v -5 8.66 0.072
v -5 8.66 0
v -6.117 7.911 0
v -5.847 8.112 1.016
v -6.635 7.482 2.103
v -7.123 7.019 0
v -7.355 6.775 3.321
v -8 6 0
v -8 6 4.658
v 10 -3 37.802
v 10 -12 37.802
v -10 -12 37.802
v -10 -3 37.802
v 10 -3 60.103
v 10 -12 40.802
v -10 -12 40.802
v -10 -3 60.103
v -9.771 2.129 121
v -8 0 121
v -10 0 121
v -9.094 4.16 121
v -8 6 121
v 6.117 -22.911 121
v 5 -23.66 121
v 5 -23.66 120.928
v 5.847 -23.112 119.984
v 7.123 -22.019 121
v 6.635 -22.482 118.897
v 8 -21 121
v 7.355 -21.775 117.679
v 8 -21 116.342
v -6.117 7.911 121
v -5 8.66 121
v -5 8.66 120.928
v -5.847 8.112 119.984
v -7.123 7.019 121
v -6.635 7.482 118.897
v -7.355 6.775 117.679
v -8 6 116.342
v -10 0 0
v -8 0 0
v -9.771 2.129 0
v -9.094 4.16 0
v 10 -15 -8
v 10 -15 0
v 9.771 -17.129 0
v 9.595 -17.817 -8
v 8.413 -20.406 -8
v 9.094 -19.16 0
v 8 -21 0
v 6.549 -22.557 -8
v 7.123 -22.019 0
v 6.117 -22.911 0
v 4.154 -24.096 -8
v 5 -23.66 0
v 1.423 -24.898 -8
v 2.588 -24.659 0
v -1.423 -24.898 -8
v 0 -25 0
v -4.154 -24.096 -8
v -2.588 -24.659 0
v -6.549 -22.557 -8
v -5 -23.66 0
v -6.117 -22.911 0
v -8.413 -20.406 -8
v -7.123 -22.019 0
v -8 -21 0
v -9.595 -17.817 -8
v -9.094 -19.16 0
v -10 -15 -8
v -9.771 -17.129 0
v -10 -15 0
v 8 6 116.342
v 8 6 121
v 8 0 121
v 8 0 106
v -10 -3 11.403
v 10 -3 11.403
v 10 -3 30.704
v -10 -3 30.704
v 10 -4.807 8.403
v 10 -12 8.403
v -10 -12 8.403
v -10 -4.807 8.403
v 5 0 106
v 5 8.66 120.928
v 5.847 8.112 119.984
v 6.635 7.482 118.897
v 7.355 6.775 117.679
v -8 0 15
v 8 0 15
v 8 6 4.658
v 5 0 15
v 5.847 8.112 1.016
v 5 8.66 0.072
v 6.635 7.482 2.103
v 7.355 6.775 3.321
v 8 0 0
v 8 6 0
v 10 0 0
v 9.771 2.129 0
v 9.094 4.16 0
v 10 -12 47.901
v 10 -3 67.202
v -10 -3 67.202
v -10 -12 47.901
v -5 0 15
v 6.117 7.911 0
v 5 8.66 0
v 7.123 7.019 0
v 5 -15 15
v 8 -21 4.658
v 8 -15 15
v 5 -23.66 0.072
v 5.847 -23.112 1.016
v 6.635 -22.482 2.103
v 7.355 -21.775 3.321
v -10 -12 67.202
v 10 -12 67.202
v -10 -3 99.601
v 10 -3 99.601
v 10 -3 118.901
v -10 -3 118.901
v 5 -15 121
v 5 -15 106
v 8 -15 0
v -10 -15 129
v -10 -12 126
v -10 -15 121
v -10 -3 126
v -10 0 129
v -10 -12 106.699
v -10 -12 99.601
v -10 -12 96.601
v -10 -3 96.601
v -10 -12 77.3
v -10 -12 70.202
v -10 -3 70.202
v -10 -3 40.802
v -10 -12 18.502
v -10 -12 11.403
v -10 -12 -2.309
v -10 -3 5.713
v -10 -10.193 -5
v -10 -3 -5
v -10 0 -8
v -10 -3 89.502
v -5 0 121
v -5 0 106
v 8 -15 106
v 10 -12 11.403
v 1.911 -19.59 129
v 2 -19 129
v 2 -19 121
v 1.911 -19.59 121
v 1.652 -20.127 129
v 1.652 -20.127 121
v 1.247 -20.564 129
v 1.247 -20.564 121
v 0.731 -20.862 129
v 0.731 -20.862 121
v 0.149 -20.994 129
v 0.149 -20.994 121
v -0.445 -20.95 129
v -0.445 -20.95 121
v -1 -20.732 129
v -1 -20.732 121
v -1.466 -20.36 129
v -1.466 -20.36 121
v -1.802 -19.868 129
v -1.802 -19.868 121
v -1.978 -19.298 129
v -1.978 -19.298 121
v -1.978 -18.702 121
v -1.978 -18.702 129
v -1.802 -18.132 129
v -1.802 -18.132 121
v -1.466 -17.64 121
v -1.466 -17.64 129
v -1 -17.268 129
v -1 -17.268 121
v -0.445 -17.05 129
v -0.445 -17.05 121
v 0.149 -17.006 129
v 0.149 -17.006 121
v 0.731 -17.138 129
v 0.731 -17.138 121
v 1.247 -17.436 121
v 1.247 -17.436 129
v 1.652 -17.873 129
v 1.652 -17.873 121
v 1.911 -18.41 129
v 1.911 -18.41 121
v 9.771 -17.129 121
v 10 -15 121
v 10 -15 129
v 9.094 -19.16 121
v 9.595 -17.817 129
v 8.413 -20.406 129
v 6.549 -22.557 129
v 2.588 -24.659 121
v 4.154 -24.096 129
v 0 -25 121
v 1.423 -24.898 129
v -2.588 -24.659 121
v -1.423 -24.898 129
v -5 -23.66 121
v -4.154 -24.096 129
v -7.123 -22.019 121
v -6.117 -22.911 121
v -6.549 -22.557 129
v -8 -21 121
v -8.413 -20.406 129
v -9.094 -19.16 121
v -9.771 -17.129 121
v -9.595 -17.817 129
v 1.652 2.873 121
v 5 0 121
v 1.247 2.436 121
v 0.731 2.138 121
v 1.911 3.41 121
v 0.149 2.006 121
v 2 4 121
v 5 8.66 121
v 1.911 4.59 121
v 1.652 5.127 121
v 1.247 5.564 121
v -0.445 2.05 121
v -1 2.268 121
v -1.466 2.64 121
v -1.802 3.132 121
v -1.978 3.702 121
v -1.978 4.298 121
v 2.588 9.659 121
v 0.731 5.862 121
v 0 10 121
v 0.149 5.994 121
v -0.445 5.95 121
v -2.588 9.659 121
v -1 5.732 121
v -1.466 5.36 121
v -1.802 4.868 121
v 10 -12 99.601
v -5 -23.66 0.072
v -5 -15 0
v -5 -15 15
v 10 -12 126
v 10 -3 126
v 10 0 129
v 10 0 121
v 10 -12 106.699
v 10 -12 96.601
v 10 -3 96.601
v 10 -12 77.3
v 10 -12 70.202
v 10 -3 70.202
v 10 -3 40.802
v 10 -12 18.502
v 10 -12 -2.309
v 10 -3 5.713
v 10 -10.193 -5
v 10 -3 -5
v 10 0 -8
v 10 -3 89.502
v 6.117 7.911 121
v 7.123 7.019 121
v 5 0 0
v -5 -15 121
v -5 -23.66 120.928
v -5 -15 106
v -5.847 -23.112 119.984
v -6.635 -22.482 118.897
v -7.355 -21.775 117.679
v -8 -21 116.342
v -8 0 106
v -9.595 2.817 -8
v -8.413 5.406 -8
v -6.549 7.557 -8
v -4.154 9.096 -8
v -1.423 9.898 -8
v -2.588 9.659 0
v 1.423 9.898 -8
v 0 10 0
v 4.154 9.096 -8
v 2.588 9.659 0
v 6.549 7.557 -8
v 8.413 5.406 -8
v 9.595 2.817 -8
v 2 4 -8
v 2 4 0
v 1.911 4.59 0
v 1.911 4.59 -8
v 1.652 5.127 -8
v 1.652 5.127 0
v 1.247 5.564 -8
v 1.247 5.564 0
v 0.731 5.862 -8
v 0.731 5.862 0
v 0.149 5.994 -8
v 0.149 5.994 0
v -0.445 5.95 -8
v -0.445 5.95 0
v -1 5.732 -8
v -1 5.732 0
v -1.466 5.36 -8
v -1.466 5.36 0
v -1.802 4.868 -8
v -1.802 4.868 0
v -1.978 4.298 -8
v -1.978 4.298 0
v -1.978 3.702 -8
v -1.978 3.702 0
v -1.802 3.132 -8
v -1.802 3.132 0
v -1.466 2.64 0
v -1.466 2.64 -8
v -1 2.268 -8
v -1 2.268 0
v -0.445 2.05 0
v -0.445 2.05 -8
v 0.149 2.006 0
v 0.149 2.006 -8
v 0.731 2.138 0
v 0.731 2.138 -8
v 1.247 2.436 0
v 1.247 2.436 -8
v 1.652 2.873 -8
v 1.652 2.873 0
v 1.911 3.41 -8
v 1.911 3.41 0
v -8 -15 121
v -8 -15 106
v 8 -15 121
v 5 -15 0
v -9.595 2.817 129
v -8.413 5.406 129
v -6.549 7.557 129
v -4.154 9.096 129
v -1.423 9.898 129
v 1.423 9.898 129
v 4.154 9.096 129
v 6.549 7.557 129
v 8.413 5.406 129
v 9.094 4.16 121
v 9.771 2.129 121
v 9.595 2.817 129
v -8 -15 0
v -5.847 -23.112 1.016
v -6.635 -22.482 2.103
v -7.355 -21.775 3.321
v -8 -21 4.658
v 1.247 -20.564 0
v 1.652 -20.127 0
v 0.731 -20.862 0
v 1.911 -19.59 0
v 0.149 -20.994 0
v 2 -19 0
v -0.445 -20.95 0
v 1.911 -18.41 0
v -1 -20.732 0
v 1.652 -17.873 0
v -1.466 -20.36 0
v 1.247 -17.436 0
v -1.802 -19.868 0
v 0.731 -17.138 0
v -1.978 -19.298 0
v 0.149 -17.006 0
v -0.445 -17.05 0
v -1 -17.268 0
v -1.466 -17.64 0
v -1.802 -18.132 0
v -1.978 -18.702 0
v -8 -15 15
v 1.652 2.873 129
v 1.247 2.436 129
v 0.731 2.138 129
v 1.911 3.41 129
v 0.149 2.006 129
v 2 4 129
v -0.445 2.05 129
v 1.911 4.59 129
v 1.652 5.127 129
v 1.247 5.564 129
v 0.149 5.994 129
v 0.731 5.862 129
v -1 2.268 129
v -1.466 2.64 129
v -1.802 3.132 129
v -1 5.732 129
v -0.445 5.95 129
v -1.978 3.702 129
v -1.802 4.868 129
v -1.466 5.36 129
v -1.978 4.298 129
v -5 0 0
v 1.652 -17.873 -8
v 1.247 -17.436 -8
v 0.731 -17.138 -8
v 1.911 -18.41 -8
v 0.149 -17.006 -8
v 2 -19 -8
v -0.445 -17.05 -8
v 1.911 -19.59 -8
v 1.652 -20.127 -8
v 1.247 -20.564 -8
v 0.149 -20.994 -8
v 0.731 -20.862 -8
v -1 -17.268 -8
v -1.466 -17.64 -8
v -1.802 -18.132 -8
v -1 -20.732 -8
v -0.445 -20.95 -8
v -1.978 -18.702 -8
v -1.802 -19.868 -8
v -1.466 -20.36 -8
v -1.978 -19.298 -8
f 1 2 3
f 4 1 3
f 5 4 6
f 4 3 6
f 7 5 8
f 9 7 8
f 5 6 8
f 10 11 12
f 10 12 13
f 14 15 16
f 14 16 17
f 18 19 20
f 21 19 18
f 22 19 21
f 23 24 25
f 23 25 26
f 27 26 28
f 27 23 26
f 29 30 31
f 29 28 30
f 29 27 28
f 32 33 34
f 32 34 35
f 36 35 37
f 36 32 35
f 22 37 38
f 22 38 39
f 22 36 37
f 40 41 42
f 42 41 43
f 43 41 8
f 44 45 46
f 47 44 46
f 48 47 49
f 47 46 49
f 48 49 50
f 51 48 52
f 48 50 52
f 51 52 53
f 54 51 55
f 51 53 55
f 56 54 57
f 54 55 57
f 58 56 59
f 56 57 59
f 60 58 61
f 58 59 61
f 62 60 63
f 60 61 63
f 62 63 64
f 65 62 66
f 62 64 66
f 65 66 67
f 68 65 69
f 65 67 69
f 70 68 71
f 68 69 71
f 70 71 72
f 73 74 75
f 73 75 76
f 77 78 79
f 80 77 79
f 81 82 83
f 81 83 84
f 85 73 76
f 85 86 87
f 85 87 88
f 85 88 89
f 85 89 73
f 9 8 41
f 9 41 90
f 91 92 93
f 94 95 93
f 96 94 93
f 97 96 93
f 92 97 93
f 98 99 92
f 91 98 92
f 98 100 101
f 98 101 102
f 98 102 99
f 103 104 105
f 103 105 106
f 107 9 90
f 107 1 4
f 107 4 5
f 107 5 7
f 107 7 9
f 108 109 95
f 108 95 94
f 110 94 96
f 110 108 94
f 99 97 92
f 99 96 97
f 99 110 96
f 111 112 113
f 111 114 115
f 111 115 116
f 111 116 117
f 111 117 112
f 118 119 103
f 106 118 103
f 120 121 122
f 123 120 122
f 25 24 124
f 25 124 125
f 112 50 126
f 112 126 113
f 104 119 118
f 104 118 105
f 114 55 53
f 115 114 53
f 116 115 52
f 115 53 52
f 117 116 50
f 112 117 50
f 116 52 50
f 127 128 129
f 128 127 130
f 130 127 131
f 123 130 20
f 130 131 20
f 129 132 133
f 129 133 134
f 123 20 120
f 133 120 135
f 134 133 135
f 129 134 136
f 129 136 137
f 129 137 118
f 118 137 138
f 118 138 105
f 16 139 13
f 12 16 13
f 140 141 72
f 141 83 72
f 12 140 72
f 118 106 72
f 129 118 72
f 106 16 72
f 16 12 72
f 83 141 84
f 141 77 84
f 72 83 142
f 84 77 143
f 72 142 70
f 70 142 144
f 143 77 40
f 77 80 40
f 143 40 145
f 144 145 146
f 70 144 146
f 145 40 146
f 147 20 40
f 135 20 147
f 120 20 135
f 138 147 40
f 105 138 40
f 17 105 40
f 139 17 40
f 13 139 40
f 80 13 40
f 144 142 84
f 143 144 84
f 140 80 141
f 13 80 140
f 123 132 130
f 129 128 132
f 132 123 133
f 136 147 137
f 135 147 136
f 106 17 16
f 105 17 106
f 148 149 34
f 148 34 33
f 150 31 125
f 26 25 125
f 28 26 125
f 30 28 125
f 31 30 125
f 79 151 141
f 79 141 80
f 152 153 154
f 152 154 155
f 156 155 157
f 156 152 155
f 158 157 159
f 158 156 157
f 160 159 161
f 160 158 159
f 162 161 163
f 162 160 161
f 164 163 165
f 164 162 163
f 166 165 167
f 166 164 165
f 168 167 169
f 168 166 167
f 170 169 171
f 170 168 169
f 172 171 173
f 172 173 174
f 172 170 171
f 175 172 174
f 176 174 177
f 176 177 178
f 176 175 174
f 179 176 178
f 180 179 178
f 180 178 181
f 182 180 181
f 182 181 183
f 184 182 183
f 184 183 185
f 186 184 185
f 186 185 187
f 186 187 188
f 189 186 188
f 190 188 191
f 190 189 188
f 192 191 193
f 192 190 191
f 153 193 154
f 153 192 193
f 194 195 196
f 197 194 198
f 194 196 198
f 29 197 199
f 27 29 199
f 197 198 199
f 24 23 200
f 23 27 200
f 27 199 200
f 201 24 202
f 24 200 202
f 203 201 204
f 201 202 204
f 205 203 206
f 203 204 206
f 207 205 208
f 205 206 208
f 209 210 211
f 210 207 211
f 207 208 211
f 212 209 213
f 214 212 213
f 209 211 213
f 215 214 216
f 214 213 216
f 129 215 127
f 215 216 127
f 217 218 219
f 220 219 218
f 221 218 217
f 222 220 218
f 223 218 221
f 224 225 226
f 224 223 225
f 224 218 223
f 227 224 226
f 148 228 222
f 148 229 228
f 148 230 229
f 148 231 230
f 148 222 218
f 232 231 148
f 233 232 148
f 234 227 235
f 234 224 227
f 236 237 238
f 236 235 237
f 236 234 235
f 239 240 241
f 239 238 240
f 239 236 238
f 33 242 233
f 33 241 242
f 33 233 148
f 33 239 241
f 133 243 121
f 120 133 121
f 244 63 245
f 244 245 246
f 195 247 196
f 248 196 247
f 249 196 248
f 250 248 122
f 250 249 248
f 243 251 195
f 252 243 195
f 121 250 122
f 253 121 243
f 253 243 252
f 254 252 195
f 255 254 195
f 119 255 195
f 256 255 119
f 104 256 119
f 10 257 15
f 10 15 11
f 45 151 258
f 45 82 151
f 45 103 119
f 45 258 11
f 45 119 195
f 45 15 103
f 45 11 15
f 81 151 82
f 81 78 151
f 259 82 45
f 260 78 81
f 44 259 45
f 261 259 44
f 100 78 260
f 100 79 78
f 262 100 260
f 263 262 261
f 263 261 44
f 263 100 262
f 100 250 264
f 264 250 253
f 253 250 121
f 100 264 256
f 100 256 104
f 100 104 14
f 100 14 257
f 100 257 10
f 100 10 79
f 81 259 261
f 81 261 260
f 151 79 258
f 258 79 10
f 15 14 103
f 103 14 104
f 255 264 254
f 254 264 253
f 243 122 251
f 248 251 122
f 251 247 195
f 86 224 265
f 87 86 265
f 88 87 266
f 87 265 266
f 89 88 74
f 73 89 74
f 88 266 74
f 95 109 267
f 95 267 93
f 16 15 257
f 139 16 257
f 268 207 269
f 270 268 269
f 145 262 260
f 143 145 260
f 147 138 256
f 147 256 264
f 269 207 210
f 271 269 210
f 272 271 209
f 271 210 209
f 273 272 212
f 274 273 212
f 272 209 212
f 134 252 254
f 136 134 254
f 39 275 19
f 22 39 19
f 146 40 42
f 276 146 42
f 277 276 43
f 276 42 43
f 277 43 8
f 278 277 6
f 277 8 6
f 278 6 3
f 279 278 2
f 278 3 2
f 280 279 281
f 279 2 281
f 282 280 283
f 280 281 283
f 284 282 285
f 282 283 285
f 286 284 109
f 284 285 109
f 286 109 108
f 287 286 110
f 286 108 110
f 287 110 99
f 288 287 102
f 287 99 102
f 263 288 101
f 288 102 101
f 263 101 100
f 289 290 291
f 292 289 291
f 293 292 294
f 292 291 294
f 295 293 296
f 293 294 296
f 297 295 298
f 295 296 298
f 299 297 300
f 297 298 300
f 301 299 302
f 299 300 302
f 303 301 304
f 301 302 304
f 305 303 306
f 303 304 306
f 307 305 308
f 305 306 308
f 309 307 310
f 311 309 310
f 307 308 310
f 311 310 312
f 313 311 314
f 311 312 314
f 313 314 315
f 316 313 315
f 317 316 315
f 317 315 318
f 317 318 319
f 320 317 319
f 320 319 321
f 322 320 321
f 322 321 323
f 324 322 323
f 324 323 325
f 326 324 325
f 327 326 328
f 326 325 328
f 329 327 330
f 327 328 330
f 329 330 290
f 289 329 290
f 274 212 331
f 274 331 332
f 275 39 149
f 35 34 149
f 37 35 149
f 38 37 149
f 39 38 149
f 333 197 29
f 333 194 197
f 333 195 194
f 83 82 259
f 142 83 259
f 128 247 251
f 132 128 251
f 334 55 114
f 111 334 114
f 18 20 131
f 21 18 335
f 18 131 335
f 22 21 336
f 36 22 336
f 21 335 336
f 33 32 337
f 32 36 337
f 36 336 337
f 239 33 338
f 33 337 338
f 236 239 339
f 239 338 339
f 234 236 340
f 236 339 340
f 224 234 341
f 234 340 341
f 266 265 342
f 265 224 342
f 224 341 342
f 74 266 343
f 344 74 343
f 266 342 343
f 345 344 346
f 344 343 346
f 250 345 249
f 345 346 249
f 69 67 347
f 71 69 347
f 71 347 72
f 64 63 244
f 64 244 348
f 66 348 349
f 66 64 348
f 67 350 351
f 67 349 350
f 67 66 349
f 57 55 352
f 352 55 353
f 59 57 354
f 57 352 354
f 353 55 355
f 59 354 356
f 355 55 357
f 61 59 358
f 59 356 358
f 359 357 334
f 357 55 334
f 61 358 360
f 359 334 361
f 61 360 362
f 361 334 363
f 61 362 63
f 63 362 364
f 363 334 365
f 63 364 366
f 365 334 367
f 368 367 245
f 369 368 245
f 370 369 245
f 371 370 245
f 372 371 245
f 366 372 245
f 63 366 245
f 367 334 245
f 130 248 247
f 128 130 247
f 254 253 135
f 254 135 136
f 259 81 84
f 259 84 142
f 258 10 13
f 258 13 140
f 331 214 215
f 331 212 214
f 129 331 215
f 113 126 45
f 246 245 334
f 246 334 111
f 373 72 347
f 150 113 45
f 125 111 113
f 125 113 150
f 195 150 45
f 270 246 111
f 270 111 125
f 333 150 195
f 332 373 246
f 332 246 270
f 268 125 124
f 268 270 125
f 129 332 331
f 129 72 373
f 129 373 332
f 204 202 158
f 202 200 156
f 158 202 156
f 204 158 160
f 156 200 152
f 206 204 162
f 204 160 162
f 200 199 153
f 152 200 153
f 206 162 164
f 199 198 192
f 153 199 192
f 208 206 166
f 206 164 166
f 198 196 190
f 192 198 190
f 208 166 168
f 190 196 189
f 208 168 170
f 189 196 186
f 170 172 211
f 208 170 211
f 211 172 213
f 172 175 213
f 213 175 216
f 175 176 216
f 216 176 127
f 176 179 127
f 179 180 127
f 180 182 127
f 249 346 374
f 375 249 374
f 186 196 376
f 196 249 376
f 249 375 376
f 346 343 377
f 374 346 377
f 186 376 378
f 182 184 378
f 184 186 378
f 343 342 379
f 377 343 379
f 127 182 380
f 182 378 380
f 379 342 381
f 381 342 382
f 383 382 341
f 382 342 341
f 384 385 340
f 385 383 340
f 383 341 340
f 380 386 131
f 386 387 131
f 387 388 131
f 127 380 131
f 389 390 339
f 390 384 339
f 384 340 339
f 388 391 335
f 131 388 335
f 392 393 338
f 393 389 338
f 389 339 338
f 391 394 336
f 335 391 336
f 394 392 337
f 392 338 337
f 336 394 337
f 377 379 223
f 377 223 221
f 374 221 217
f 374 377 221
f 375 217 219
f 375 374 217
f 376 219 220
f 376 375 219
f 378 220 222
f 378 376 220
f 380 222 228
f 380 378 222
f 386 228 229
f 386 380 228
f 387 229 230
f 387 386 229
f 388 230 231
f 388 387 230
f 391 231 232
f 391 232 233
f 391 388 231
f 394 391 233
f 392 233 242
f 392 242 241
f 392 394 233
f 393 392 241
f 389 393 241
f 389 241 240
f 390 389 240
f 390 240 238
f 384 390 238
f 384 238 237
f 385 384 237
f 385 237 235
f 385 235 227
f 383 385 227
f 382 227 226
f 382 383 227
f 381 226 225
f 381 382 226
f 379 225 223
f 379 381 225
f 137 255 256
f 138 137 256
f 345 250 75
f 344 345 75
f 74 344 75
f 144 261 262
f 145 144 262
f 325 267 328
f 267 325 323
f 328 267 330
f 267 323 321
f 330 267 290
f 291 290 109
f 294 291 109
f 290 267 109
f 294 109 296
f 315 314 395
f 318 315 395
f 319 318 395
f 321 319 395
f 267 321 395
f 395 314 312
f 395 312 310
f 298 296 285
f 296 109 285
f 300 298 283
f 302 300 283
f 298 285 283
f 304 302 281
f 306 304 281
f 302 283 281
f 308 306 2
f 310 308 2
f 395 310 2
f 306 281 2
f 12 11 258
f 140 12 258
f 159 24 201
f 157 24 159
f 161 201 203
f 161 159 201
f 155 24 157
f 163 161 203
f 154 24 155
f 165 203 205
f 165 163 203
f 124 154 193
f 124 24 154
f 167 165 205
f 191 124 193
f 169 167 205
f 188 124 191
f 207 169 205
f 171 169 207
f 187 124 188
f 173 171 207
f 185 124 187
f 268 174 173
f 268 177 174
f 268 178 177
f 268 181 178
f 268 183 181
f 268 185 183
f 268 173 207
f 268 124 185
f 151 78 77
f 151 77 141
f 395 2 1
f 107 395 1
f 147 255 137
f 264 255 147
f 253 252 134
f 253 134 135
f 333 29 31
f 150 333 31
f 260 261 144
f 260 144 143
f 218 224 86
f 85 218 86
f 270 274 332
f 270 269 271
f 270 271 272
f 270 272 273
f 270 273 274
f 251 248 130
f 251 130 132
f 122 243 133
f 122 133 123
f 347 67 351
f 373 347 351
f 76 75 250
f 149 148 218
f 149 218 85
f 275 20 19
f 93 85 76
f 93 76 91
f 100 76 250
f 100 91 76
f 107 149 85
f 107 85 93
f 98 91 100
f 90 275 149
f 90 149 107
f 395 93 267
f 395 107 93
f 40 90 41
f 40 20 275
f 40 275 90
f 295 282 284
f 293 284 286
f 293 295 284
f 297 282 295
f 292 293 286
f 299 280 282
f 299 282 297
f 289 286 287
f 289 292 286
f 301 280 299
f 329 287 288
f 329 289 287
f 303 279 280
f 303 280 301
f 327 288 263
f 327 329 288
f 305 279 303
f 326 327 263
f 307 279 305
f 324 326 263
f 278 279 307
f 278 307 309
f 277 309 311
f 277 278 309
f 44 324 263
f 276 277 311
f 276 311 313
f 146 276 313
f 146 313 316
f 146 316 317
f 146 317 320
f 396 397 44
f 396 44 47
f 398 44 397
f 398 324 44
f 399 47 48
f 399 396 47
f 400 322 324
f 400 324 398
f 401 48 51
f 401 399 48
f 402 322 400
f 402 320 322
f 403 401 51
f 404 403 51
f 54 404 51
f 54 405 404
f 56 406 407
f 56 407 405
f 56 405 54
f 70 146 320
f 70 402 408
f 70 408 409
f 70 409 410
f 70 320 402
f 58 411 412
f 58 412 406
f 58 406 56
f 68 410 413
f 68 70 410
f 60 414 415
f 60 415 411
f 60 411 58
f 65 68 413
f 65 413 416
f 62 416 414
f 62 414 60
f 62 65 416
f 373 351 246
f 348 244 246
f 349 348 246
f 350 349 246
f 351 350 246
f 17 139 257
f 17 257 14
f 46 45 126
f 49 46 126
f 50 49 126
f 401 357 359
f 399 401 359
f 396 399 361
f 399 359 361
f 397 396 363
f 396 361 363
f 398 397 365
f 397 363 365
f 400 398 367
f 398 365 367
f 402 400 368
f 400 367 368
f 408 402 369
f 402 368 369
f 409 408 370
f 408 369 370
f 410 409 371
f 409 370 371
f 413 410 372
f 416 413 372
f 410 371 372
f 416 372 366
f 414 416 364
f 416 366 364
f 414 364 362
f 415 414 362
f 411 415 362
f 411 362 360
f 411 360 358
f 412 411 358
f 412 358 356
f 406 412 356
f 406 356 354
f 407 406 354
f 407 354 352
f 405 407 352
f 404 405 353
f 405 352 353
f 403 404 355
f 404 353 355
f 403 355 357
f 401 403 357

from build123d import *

# Parameters (mm, degrees)
SKETCH1_R             = 2
BOSS_EXTRUDE1_DEPTH   = 8
BOSS_EXTRUDE1_2_DEPTH = 8
BOSS_EXTRUDE2_DEPTH   = 20
BOSS_EXTRUDE3_DEPTH   = 20
BOSS_EXTRUDE4_START   = -8
SKETCH4_R             = 2
BOSS_EXTRUDE4_DEPTH   = 8
CUT_EXTRUDE1_DEPTH    = 133.91350571
SKETCH7_W             = 3
SKETCH7_H             = 9
BOSS_EXTRUDE5_DEPTH   = 20
BOSS_EXTRUDE6_DEPTH   = 3
CUT_EXTRUDE2_DEPTH    = 132.780119897
MIRROR2_COPY_1_DEPTH  = 3
MIRROR2_COPY_2_DEPTH  = 132.780119897
MIRROR3_COPY_1_DEPTH  = 3
MIRROR3_COPY_2_DEPTH  = 132.780119897
MIRROR3_COPY_3_DEPTH  = 3
MIRROR3_COPY_4_DEPTH  = 132.780119897
MIRROR3_COPY_5_DEPTH  = 3
MIRROR3_COPY_6_DEPTH  = 132.780119897


with BuildPart() as part:
    # Sketch1 → Boss-Extrude1 (new body)
    with BuildSketch(Plane.XY):
        with BuildLine():
            Line((-10, -15), (10, -15))
            ThreePointArc((10, -15), (0, -25), (-10, -15))
        make_face()
        with Locations((0, -19)):
            Circle(SKETCH1_R, mode=Mode.SUBTRACT)
    extrude(amount=-BOSS_EXTRUDE1_DEPTH)



with BuildPart() as body_2:
    # Sketch1 → Boss-Extrude1 2 (new body)
    with BuildSketch(Plane.XY):
        with BuildLine():
            Line((10, 0), (-10, 0))
            ThreePointArc((-10, 0), (0, 10), (10, 0))
        make_face()
        with Locations((0, 4)):
            Circle(SKETCH1_R, mode=Mode.SUBTRACT)
    extrude(amount=-BOSS_EXTRUDE1_2_DEPTH)


with BuildPart() as part_1:
    add(part.part)

    add(body_2.part)  # Boss-Extrude2 merges body 2
    # Sketch2 → Boss-Extrude2 (add)
    with BuildSketch(Plane.ZY.offset(10)):
        Polygon((0, -15), (67, -15), (67, -7.5), (54, -7.5), (54, 0), (0, 0), (-8, 0), (-8, -15), align=None)
    extrude(amount=-BOSS_EXTRUDE2_DEPTH)

    # Sketch3 → Boss-Extrude3 (add)
    with BuildSketch(Plane.ZY.offset(10)):
        Polygon((54, 0), (54, -7.5), (67, -7.5), (67, -15), (121, -15), (129, -15), (129, 0), (121, 0), align=None)
    extrude(amount=-BOSS_EXTRUDE3_DEPTH)

    # Sketch4 → Boss-Extrude4 (add)
    # profile 1 of 2: a face of its own
    with BuildSketch(Plane(origin=(0, 0, 121), x_dir=(-1, 0, 0), z_dir=(0, 0, -1)).offset(BOSS_EXTRUDE4_START)):
        with BuildLine():
            Line((-10, 0), (10, 0))
            ThreePointArc((10, 0), (0, 10), (-10, 0))
        make_face()
        with Locations(Location((0, 4, 0), (0, 0, 180))):
            Circle(SKETCH4_R, mode=Mode.SUBTRACT)
    # profile 2 of 2: a face of its own
    with BuildSketch(Plane(origin=(0, 0, 121), x_dir=(-1, 0, 0), z_dir=(0, 0, -1)).offset(BOSS_EXTRUDE4_START)):
        with BuildLine():
            Line((10, -15), (-10, -15))
            ThreePointArc((-10, -15), (0, -25), (10, -15))
        make_face()
        with Locations(Location((0, -19, 0), (0, 0, 180))):
            Circle(SKETCH4_R, mode=Mode.SUBTRACT)
    extrude(amount=BOSS_EXTRUDE4_DEPTH)

    # Sketch6 → Cut-Extrude1 (cut, through all)
    with BuildSketch(Plane(origin=(10, 0, 0), x_dir=(0, 0, -1), z_dir=(1, 0, 0))):
        Polygon((0, -3), (-121, -3), (-126, -3), (-126, -12), (-121, -12), (0, -12), (5, -12), (5, -3), align=None)
    extrude(amount=-CUT_EXTRUDE1_DEPTH, mode=Mode.SUBTRACT)

    # Sketch7 → Boss-Extrude5 (add)
    with BuildSketch(Plane(origin=(10, 0, 0), x_dir=(0, 0, -1), z_dir=(1, 0, 0))):
        Polygon((5, -12), (-8.403331864, -3), (-8.403331864, -4.806786238), (2.309227161, -12), align=None)
        Polygon((-5.712559024, -3), (-8.403331864, -3), (5, -12), (5, -10.193213762), align=None)
        Polygon((-11.403331864, -3), (-11.403331864, -12), (-8.403331864, -12), (-8.403331864, -4.806786238), (-8.403331864, -3), align=None)
        Polygon((-30.703894148, -3), (-37.802498898, -3), (-18.501936613, -12), (-11.403331864, -12), align=None)
        with Locations((-39.302498898, -7.5)):
            Rectangle(SKETCH7_W, SKETCH7_H)
        Polygon((-60.103061182, -3), (-67.201665932, -3), (-47.901103647, -12), (-40.802498898, -12), align=None)
        with Locations((-68.701665932, -7.5)):
            Rectangle(SKETCH7_W, SKETCH7_H)
        Polygon((-89.502228216, -3), (-96.600832966, -3), (-77.300270681, -12), (-70.201665932, -12), align=None)
        with Locations((-98.100832966, -7.5)):
            Rectangle(SKETCH7_W, SKETCH7_H)
        Polygon((-118.901395251, -3), (-126, -3), (-106.699437715, -12), (-99.600832966, -12), align=None)
    extrude(amount=-BOSS_EXTRUDE5_DEPTH)

    # Sketch9 → Boss-Extrude6 (add)
    with BuildSketch(Plane(origin=(5, 0, 0), x_dir=(0, 0, -1), z_dir=(1, 0, 0))):
        Polygon((0, -15), (0, -23.702060424), (-15, -15), align=None)
    boss_extrude6 = extrude(amount=BOSS_EXTRUDE6_DEPTH)

    # Sketch10 → Cut-Extrude2 (cut, through all)
    with BuildSketch(Plane(origin=(0, 0, 0), x_dir=(-1, 0, 0), z_dir=(0, 0, -1))):
        with BuildLine():
            Line((-8, -21), (-8, -23.702060424))
            Line((-8, -23.702060424), (-5, -23.702060424))
            Line((-5, -23.702060424), (-5, -23.660254038))
            ThreePointArc((-5, -23.660254038), (-6.634699532, -22.482029278), (-8, -21))
        make_face()
    cut_extrude2 = extrude(amount=-CUT_EXTRUDE2_DEPTH, mode=Mode.SUBTRACT)

    # Mirror1: Boss-Extrude6, Cut-Extrude2 across plane
    add(boss_extrude6.mirror(Plane(origin=(0, 0, 0), x_dir=(0, 0, 1), z_dir=(1, 0, 0))))
    add(cut_extrude2.mirror(Plane(origin=(0, 0, 0), x_dir=(0, 0, 1), z_dir=(1, 0, 0))), mode=Mode.SUBTRACT)

    # Mirror2: Boss-Extrude6, Cut-Extrude2 across plane
    add(boss_extrude6.mirror(Plane(origin=(0, 0, 60.5), x_dir=(1, 0, 0), z_dir=(0, 0, -1))))
    add(cut_extrude2.mirror(Plane(origin=(0, 0, 60.5), x_dir=(1, 0, 0), z_dir=(0, 0, -1))), mode=Mode.SUBTRACT)

    # Mirror2 copy 1 sketch → Mirror2 copy 1 (add)
    with BuildSketch(Plane(origin=(-5, 0, 121), x_dir=(0, 0, 1), z_dir=(-1, 0, 0))):
        Polygon((0, -15), (0, -23.702060424), (-15, -15), align=None)
    extrude(amount=MIRROR2_COPY_1_DEPTH)

    # Mirror2 copy 2 sketch → Mirror2 copy 2 (cut, through all)
    with BuildSketch(Plane.XY.offset(121)):
        with BuildLine():
            Line((-8, -21), (-8, -23.702060424))
            Line((-8, -23.702060424), (-5, -23.702060424))
            Line((-5, -23.702060424), (-5, -23.660254038))
            ThreePointArc((-5, -23.660254038), (-6.634699532, -22.482029278), (-8, -21))
        make_face()
    extrude(amount=-MIRROR2_COPY_2_DEPTH, mode=Mode.SUBTRACT)

    # Mirror3: Boss-Extrude6, Cut-Extrude2 across plane
    add(boss_extrude6.mirror(Plane.ZX.offset(-7.5)))
    add(cut_extrude2.mirror(Plane.ZX.offset(-7.5)), mode=Mode.SUBTRACT)

    # Mirror3 copy 1 sketch → Mirror3 copy 1 (add)
    with BuildSketch(Plane(origin=(-5, -15, 0), x_dir=(0, 0, -1), z_dir=(-1, 0, 0))):
        Polygon((0, -15), (0, -23.702060424), (-15, -15), align=None)
    extrude(amount=MIRROR3_COPY_1_DEPTH)

    # Mirror3 copy 2 sketch → Mirror3 copy 2 (cut, through all)
    with BuildSketch(Plane(origin=(0, -15, 0), x_dir=(1, 0, 0), z_dir=(0, 0, -1))):
        with BuildLine():
            Line((-8, -21), (-8, -23.702060424))
            Line((-8, -23.702060424), (-5, -23.702060424))
            Line((-5, -23.702060424), (-5, -23.660254038))
            ThreePointArc((-5, -23.660254038), (-6.634699532, -22.482029278), (-8, -21))
        make_face()
    extrude(amount=-MIRROR3_COPY_2_DEPTH, mode=Mode.SUBTRACT)

    # Mirror3 copy 3 sketch → Mirror3 copy 3 (add)
    with BuildSketch(Plane(origin=(5, -15, 121), x_dir=(0, 0, 1), z_dir=(1, 0, 0))):
        Polygon((0, -15), (0, -23.702060424), (-15, -15), align=None)
    extrude(amount=MIRROR3_COPY_3_DEPTH)

    # Mirror3 copy 4 sketch → Mirror3 copy 4 (cut, through all)
    with BuildSketch(Plane(origin=(0, -15, 121), x_dir=(-1, 0, 0), z_dir=(0, 0, 1))):
        with BuildLine():
            Line((-8, -21), (-8, -23.702060424))
            Line((-8, -23.702060424), (-5, -23.702060424))
            Line((-5, -23.702060424), (-5, -23.660254038))
            ThreePointArc((-5, -23.660254038), (-6.634699532, -22.482029278), (-8, -21))
        make_face()
    extrude(amount=-MIRROR3_COPY_4_DEPTH, mode=Mode.SUBTRACT)

    # Mirror3 copy 5 sketch → Mirror3 copy 5 (add)
    with BuildSketch(Plane(origin=(-5, -15, 121), x_dir=(0, 0, 1), z_dir=(-1, 0, 0))):
        Polygon((0, 15), (0, 23.702060424), (-15, 15), align=None)
    extrude(amount=MIRROR3_COPY_5_DEPTH)

    # Mirror3 copy 6 sketch → Mirror3 copy 6 (cut, through all)
    with BuildSketch(Plane(origin=(0, -15, 121), x_dir=(1, 0, 0), z_dir=(0, 0, 1))):
        with BuildLine():
            Line((-8, 21), (-8, 23.702060424))
            Line((-8, 23.702060424), (-5, 23.702060424))
            Line((-5, 23.702060424), (-5, 23.660254038))
            ThreePointArc((-5, 23.660254038), (-6.634699532, 22.482029278), (-8, 21))
        make_face()
    extrude(amount=-MIRROR3_COPY_6_DEPTH, mode=Mode.SUBTRACT)


solid = part_1.part
